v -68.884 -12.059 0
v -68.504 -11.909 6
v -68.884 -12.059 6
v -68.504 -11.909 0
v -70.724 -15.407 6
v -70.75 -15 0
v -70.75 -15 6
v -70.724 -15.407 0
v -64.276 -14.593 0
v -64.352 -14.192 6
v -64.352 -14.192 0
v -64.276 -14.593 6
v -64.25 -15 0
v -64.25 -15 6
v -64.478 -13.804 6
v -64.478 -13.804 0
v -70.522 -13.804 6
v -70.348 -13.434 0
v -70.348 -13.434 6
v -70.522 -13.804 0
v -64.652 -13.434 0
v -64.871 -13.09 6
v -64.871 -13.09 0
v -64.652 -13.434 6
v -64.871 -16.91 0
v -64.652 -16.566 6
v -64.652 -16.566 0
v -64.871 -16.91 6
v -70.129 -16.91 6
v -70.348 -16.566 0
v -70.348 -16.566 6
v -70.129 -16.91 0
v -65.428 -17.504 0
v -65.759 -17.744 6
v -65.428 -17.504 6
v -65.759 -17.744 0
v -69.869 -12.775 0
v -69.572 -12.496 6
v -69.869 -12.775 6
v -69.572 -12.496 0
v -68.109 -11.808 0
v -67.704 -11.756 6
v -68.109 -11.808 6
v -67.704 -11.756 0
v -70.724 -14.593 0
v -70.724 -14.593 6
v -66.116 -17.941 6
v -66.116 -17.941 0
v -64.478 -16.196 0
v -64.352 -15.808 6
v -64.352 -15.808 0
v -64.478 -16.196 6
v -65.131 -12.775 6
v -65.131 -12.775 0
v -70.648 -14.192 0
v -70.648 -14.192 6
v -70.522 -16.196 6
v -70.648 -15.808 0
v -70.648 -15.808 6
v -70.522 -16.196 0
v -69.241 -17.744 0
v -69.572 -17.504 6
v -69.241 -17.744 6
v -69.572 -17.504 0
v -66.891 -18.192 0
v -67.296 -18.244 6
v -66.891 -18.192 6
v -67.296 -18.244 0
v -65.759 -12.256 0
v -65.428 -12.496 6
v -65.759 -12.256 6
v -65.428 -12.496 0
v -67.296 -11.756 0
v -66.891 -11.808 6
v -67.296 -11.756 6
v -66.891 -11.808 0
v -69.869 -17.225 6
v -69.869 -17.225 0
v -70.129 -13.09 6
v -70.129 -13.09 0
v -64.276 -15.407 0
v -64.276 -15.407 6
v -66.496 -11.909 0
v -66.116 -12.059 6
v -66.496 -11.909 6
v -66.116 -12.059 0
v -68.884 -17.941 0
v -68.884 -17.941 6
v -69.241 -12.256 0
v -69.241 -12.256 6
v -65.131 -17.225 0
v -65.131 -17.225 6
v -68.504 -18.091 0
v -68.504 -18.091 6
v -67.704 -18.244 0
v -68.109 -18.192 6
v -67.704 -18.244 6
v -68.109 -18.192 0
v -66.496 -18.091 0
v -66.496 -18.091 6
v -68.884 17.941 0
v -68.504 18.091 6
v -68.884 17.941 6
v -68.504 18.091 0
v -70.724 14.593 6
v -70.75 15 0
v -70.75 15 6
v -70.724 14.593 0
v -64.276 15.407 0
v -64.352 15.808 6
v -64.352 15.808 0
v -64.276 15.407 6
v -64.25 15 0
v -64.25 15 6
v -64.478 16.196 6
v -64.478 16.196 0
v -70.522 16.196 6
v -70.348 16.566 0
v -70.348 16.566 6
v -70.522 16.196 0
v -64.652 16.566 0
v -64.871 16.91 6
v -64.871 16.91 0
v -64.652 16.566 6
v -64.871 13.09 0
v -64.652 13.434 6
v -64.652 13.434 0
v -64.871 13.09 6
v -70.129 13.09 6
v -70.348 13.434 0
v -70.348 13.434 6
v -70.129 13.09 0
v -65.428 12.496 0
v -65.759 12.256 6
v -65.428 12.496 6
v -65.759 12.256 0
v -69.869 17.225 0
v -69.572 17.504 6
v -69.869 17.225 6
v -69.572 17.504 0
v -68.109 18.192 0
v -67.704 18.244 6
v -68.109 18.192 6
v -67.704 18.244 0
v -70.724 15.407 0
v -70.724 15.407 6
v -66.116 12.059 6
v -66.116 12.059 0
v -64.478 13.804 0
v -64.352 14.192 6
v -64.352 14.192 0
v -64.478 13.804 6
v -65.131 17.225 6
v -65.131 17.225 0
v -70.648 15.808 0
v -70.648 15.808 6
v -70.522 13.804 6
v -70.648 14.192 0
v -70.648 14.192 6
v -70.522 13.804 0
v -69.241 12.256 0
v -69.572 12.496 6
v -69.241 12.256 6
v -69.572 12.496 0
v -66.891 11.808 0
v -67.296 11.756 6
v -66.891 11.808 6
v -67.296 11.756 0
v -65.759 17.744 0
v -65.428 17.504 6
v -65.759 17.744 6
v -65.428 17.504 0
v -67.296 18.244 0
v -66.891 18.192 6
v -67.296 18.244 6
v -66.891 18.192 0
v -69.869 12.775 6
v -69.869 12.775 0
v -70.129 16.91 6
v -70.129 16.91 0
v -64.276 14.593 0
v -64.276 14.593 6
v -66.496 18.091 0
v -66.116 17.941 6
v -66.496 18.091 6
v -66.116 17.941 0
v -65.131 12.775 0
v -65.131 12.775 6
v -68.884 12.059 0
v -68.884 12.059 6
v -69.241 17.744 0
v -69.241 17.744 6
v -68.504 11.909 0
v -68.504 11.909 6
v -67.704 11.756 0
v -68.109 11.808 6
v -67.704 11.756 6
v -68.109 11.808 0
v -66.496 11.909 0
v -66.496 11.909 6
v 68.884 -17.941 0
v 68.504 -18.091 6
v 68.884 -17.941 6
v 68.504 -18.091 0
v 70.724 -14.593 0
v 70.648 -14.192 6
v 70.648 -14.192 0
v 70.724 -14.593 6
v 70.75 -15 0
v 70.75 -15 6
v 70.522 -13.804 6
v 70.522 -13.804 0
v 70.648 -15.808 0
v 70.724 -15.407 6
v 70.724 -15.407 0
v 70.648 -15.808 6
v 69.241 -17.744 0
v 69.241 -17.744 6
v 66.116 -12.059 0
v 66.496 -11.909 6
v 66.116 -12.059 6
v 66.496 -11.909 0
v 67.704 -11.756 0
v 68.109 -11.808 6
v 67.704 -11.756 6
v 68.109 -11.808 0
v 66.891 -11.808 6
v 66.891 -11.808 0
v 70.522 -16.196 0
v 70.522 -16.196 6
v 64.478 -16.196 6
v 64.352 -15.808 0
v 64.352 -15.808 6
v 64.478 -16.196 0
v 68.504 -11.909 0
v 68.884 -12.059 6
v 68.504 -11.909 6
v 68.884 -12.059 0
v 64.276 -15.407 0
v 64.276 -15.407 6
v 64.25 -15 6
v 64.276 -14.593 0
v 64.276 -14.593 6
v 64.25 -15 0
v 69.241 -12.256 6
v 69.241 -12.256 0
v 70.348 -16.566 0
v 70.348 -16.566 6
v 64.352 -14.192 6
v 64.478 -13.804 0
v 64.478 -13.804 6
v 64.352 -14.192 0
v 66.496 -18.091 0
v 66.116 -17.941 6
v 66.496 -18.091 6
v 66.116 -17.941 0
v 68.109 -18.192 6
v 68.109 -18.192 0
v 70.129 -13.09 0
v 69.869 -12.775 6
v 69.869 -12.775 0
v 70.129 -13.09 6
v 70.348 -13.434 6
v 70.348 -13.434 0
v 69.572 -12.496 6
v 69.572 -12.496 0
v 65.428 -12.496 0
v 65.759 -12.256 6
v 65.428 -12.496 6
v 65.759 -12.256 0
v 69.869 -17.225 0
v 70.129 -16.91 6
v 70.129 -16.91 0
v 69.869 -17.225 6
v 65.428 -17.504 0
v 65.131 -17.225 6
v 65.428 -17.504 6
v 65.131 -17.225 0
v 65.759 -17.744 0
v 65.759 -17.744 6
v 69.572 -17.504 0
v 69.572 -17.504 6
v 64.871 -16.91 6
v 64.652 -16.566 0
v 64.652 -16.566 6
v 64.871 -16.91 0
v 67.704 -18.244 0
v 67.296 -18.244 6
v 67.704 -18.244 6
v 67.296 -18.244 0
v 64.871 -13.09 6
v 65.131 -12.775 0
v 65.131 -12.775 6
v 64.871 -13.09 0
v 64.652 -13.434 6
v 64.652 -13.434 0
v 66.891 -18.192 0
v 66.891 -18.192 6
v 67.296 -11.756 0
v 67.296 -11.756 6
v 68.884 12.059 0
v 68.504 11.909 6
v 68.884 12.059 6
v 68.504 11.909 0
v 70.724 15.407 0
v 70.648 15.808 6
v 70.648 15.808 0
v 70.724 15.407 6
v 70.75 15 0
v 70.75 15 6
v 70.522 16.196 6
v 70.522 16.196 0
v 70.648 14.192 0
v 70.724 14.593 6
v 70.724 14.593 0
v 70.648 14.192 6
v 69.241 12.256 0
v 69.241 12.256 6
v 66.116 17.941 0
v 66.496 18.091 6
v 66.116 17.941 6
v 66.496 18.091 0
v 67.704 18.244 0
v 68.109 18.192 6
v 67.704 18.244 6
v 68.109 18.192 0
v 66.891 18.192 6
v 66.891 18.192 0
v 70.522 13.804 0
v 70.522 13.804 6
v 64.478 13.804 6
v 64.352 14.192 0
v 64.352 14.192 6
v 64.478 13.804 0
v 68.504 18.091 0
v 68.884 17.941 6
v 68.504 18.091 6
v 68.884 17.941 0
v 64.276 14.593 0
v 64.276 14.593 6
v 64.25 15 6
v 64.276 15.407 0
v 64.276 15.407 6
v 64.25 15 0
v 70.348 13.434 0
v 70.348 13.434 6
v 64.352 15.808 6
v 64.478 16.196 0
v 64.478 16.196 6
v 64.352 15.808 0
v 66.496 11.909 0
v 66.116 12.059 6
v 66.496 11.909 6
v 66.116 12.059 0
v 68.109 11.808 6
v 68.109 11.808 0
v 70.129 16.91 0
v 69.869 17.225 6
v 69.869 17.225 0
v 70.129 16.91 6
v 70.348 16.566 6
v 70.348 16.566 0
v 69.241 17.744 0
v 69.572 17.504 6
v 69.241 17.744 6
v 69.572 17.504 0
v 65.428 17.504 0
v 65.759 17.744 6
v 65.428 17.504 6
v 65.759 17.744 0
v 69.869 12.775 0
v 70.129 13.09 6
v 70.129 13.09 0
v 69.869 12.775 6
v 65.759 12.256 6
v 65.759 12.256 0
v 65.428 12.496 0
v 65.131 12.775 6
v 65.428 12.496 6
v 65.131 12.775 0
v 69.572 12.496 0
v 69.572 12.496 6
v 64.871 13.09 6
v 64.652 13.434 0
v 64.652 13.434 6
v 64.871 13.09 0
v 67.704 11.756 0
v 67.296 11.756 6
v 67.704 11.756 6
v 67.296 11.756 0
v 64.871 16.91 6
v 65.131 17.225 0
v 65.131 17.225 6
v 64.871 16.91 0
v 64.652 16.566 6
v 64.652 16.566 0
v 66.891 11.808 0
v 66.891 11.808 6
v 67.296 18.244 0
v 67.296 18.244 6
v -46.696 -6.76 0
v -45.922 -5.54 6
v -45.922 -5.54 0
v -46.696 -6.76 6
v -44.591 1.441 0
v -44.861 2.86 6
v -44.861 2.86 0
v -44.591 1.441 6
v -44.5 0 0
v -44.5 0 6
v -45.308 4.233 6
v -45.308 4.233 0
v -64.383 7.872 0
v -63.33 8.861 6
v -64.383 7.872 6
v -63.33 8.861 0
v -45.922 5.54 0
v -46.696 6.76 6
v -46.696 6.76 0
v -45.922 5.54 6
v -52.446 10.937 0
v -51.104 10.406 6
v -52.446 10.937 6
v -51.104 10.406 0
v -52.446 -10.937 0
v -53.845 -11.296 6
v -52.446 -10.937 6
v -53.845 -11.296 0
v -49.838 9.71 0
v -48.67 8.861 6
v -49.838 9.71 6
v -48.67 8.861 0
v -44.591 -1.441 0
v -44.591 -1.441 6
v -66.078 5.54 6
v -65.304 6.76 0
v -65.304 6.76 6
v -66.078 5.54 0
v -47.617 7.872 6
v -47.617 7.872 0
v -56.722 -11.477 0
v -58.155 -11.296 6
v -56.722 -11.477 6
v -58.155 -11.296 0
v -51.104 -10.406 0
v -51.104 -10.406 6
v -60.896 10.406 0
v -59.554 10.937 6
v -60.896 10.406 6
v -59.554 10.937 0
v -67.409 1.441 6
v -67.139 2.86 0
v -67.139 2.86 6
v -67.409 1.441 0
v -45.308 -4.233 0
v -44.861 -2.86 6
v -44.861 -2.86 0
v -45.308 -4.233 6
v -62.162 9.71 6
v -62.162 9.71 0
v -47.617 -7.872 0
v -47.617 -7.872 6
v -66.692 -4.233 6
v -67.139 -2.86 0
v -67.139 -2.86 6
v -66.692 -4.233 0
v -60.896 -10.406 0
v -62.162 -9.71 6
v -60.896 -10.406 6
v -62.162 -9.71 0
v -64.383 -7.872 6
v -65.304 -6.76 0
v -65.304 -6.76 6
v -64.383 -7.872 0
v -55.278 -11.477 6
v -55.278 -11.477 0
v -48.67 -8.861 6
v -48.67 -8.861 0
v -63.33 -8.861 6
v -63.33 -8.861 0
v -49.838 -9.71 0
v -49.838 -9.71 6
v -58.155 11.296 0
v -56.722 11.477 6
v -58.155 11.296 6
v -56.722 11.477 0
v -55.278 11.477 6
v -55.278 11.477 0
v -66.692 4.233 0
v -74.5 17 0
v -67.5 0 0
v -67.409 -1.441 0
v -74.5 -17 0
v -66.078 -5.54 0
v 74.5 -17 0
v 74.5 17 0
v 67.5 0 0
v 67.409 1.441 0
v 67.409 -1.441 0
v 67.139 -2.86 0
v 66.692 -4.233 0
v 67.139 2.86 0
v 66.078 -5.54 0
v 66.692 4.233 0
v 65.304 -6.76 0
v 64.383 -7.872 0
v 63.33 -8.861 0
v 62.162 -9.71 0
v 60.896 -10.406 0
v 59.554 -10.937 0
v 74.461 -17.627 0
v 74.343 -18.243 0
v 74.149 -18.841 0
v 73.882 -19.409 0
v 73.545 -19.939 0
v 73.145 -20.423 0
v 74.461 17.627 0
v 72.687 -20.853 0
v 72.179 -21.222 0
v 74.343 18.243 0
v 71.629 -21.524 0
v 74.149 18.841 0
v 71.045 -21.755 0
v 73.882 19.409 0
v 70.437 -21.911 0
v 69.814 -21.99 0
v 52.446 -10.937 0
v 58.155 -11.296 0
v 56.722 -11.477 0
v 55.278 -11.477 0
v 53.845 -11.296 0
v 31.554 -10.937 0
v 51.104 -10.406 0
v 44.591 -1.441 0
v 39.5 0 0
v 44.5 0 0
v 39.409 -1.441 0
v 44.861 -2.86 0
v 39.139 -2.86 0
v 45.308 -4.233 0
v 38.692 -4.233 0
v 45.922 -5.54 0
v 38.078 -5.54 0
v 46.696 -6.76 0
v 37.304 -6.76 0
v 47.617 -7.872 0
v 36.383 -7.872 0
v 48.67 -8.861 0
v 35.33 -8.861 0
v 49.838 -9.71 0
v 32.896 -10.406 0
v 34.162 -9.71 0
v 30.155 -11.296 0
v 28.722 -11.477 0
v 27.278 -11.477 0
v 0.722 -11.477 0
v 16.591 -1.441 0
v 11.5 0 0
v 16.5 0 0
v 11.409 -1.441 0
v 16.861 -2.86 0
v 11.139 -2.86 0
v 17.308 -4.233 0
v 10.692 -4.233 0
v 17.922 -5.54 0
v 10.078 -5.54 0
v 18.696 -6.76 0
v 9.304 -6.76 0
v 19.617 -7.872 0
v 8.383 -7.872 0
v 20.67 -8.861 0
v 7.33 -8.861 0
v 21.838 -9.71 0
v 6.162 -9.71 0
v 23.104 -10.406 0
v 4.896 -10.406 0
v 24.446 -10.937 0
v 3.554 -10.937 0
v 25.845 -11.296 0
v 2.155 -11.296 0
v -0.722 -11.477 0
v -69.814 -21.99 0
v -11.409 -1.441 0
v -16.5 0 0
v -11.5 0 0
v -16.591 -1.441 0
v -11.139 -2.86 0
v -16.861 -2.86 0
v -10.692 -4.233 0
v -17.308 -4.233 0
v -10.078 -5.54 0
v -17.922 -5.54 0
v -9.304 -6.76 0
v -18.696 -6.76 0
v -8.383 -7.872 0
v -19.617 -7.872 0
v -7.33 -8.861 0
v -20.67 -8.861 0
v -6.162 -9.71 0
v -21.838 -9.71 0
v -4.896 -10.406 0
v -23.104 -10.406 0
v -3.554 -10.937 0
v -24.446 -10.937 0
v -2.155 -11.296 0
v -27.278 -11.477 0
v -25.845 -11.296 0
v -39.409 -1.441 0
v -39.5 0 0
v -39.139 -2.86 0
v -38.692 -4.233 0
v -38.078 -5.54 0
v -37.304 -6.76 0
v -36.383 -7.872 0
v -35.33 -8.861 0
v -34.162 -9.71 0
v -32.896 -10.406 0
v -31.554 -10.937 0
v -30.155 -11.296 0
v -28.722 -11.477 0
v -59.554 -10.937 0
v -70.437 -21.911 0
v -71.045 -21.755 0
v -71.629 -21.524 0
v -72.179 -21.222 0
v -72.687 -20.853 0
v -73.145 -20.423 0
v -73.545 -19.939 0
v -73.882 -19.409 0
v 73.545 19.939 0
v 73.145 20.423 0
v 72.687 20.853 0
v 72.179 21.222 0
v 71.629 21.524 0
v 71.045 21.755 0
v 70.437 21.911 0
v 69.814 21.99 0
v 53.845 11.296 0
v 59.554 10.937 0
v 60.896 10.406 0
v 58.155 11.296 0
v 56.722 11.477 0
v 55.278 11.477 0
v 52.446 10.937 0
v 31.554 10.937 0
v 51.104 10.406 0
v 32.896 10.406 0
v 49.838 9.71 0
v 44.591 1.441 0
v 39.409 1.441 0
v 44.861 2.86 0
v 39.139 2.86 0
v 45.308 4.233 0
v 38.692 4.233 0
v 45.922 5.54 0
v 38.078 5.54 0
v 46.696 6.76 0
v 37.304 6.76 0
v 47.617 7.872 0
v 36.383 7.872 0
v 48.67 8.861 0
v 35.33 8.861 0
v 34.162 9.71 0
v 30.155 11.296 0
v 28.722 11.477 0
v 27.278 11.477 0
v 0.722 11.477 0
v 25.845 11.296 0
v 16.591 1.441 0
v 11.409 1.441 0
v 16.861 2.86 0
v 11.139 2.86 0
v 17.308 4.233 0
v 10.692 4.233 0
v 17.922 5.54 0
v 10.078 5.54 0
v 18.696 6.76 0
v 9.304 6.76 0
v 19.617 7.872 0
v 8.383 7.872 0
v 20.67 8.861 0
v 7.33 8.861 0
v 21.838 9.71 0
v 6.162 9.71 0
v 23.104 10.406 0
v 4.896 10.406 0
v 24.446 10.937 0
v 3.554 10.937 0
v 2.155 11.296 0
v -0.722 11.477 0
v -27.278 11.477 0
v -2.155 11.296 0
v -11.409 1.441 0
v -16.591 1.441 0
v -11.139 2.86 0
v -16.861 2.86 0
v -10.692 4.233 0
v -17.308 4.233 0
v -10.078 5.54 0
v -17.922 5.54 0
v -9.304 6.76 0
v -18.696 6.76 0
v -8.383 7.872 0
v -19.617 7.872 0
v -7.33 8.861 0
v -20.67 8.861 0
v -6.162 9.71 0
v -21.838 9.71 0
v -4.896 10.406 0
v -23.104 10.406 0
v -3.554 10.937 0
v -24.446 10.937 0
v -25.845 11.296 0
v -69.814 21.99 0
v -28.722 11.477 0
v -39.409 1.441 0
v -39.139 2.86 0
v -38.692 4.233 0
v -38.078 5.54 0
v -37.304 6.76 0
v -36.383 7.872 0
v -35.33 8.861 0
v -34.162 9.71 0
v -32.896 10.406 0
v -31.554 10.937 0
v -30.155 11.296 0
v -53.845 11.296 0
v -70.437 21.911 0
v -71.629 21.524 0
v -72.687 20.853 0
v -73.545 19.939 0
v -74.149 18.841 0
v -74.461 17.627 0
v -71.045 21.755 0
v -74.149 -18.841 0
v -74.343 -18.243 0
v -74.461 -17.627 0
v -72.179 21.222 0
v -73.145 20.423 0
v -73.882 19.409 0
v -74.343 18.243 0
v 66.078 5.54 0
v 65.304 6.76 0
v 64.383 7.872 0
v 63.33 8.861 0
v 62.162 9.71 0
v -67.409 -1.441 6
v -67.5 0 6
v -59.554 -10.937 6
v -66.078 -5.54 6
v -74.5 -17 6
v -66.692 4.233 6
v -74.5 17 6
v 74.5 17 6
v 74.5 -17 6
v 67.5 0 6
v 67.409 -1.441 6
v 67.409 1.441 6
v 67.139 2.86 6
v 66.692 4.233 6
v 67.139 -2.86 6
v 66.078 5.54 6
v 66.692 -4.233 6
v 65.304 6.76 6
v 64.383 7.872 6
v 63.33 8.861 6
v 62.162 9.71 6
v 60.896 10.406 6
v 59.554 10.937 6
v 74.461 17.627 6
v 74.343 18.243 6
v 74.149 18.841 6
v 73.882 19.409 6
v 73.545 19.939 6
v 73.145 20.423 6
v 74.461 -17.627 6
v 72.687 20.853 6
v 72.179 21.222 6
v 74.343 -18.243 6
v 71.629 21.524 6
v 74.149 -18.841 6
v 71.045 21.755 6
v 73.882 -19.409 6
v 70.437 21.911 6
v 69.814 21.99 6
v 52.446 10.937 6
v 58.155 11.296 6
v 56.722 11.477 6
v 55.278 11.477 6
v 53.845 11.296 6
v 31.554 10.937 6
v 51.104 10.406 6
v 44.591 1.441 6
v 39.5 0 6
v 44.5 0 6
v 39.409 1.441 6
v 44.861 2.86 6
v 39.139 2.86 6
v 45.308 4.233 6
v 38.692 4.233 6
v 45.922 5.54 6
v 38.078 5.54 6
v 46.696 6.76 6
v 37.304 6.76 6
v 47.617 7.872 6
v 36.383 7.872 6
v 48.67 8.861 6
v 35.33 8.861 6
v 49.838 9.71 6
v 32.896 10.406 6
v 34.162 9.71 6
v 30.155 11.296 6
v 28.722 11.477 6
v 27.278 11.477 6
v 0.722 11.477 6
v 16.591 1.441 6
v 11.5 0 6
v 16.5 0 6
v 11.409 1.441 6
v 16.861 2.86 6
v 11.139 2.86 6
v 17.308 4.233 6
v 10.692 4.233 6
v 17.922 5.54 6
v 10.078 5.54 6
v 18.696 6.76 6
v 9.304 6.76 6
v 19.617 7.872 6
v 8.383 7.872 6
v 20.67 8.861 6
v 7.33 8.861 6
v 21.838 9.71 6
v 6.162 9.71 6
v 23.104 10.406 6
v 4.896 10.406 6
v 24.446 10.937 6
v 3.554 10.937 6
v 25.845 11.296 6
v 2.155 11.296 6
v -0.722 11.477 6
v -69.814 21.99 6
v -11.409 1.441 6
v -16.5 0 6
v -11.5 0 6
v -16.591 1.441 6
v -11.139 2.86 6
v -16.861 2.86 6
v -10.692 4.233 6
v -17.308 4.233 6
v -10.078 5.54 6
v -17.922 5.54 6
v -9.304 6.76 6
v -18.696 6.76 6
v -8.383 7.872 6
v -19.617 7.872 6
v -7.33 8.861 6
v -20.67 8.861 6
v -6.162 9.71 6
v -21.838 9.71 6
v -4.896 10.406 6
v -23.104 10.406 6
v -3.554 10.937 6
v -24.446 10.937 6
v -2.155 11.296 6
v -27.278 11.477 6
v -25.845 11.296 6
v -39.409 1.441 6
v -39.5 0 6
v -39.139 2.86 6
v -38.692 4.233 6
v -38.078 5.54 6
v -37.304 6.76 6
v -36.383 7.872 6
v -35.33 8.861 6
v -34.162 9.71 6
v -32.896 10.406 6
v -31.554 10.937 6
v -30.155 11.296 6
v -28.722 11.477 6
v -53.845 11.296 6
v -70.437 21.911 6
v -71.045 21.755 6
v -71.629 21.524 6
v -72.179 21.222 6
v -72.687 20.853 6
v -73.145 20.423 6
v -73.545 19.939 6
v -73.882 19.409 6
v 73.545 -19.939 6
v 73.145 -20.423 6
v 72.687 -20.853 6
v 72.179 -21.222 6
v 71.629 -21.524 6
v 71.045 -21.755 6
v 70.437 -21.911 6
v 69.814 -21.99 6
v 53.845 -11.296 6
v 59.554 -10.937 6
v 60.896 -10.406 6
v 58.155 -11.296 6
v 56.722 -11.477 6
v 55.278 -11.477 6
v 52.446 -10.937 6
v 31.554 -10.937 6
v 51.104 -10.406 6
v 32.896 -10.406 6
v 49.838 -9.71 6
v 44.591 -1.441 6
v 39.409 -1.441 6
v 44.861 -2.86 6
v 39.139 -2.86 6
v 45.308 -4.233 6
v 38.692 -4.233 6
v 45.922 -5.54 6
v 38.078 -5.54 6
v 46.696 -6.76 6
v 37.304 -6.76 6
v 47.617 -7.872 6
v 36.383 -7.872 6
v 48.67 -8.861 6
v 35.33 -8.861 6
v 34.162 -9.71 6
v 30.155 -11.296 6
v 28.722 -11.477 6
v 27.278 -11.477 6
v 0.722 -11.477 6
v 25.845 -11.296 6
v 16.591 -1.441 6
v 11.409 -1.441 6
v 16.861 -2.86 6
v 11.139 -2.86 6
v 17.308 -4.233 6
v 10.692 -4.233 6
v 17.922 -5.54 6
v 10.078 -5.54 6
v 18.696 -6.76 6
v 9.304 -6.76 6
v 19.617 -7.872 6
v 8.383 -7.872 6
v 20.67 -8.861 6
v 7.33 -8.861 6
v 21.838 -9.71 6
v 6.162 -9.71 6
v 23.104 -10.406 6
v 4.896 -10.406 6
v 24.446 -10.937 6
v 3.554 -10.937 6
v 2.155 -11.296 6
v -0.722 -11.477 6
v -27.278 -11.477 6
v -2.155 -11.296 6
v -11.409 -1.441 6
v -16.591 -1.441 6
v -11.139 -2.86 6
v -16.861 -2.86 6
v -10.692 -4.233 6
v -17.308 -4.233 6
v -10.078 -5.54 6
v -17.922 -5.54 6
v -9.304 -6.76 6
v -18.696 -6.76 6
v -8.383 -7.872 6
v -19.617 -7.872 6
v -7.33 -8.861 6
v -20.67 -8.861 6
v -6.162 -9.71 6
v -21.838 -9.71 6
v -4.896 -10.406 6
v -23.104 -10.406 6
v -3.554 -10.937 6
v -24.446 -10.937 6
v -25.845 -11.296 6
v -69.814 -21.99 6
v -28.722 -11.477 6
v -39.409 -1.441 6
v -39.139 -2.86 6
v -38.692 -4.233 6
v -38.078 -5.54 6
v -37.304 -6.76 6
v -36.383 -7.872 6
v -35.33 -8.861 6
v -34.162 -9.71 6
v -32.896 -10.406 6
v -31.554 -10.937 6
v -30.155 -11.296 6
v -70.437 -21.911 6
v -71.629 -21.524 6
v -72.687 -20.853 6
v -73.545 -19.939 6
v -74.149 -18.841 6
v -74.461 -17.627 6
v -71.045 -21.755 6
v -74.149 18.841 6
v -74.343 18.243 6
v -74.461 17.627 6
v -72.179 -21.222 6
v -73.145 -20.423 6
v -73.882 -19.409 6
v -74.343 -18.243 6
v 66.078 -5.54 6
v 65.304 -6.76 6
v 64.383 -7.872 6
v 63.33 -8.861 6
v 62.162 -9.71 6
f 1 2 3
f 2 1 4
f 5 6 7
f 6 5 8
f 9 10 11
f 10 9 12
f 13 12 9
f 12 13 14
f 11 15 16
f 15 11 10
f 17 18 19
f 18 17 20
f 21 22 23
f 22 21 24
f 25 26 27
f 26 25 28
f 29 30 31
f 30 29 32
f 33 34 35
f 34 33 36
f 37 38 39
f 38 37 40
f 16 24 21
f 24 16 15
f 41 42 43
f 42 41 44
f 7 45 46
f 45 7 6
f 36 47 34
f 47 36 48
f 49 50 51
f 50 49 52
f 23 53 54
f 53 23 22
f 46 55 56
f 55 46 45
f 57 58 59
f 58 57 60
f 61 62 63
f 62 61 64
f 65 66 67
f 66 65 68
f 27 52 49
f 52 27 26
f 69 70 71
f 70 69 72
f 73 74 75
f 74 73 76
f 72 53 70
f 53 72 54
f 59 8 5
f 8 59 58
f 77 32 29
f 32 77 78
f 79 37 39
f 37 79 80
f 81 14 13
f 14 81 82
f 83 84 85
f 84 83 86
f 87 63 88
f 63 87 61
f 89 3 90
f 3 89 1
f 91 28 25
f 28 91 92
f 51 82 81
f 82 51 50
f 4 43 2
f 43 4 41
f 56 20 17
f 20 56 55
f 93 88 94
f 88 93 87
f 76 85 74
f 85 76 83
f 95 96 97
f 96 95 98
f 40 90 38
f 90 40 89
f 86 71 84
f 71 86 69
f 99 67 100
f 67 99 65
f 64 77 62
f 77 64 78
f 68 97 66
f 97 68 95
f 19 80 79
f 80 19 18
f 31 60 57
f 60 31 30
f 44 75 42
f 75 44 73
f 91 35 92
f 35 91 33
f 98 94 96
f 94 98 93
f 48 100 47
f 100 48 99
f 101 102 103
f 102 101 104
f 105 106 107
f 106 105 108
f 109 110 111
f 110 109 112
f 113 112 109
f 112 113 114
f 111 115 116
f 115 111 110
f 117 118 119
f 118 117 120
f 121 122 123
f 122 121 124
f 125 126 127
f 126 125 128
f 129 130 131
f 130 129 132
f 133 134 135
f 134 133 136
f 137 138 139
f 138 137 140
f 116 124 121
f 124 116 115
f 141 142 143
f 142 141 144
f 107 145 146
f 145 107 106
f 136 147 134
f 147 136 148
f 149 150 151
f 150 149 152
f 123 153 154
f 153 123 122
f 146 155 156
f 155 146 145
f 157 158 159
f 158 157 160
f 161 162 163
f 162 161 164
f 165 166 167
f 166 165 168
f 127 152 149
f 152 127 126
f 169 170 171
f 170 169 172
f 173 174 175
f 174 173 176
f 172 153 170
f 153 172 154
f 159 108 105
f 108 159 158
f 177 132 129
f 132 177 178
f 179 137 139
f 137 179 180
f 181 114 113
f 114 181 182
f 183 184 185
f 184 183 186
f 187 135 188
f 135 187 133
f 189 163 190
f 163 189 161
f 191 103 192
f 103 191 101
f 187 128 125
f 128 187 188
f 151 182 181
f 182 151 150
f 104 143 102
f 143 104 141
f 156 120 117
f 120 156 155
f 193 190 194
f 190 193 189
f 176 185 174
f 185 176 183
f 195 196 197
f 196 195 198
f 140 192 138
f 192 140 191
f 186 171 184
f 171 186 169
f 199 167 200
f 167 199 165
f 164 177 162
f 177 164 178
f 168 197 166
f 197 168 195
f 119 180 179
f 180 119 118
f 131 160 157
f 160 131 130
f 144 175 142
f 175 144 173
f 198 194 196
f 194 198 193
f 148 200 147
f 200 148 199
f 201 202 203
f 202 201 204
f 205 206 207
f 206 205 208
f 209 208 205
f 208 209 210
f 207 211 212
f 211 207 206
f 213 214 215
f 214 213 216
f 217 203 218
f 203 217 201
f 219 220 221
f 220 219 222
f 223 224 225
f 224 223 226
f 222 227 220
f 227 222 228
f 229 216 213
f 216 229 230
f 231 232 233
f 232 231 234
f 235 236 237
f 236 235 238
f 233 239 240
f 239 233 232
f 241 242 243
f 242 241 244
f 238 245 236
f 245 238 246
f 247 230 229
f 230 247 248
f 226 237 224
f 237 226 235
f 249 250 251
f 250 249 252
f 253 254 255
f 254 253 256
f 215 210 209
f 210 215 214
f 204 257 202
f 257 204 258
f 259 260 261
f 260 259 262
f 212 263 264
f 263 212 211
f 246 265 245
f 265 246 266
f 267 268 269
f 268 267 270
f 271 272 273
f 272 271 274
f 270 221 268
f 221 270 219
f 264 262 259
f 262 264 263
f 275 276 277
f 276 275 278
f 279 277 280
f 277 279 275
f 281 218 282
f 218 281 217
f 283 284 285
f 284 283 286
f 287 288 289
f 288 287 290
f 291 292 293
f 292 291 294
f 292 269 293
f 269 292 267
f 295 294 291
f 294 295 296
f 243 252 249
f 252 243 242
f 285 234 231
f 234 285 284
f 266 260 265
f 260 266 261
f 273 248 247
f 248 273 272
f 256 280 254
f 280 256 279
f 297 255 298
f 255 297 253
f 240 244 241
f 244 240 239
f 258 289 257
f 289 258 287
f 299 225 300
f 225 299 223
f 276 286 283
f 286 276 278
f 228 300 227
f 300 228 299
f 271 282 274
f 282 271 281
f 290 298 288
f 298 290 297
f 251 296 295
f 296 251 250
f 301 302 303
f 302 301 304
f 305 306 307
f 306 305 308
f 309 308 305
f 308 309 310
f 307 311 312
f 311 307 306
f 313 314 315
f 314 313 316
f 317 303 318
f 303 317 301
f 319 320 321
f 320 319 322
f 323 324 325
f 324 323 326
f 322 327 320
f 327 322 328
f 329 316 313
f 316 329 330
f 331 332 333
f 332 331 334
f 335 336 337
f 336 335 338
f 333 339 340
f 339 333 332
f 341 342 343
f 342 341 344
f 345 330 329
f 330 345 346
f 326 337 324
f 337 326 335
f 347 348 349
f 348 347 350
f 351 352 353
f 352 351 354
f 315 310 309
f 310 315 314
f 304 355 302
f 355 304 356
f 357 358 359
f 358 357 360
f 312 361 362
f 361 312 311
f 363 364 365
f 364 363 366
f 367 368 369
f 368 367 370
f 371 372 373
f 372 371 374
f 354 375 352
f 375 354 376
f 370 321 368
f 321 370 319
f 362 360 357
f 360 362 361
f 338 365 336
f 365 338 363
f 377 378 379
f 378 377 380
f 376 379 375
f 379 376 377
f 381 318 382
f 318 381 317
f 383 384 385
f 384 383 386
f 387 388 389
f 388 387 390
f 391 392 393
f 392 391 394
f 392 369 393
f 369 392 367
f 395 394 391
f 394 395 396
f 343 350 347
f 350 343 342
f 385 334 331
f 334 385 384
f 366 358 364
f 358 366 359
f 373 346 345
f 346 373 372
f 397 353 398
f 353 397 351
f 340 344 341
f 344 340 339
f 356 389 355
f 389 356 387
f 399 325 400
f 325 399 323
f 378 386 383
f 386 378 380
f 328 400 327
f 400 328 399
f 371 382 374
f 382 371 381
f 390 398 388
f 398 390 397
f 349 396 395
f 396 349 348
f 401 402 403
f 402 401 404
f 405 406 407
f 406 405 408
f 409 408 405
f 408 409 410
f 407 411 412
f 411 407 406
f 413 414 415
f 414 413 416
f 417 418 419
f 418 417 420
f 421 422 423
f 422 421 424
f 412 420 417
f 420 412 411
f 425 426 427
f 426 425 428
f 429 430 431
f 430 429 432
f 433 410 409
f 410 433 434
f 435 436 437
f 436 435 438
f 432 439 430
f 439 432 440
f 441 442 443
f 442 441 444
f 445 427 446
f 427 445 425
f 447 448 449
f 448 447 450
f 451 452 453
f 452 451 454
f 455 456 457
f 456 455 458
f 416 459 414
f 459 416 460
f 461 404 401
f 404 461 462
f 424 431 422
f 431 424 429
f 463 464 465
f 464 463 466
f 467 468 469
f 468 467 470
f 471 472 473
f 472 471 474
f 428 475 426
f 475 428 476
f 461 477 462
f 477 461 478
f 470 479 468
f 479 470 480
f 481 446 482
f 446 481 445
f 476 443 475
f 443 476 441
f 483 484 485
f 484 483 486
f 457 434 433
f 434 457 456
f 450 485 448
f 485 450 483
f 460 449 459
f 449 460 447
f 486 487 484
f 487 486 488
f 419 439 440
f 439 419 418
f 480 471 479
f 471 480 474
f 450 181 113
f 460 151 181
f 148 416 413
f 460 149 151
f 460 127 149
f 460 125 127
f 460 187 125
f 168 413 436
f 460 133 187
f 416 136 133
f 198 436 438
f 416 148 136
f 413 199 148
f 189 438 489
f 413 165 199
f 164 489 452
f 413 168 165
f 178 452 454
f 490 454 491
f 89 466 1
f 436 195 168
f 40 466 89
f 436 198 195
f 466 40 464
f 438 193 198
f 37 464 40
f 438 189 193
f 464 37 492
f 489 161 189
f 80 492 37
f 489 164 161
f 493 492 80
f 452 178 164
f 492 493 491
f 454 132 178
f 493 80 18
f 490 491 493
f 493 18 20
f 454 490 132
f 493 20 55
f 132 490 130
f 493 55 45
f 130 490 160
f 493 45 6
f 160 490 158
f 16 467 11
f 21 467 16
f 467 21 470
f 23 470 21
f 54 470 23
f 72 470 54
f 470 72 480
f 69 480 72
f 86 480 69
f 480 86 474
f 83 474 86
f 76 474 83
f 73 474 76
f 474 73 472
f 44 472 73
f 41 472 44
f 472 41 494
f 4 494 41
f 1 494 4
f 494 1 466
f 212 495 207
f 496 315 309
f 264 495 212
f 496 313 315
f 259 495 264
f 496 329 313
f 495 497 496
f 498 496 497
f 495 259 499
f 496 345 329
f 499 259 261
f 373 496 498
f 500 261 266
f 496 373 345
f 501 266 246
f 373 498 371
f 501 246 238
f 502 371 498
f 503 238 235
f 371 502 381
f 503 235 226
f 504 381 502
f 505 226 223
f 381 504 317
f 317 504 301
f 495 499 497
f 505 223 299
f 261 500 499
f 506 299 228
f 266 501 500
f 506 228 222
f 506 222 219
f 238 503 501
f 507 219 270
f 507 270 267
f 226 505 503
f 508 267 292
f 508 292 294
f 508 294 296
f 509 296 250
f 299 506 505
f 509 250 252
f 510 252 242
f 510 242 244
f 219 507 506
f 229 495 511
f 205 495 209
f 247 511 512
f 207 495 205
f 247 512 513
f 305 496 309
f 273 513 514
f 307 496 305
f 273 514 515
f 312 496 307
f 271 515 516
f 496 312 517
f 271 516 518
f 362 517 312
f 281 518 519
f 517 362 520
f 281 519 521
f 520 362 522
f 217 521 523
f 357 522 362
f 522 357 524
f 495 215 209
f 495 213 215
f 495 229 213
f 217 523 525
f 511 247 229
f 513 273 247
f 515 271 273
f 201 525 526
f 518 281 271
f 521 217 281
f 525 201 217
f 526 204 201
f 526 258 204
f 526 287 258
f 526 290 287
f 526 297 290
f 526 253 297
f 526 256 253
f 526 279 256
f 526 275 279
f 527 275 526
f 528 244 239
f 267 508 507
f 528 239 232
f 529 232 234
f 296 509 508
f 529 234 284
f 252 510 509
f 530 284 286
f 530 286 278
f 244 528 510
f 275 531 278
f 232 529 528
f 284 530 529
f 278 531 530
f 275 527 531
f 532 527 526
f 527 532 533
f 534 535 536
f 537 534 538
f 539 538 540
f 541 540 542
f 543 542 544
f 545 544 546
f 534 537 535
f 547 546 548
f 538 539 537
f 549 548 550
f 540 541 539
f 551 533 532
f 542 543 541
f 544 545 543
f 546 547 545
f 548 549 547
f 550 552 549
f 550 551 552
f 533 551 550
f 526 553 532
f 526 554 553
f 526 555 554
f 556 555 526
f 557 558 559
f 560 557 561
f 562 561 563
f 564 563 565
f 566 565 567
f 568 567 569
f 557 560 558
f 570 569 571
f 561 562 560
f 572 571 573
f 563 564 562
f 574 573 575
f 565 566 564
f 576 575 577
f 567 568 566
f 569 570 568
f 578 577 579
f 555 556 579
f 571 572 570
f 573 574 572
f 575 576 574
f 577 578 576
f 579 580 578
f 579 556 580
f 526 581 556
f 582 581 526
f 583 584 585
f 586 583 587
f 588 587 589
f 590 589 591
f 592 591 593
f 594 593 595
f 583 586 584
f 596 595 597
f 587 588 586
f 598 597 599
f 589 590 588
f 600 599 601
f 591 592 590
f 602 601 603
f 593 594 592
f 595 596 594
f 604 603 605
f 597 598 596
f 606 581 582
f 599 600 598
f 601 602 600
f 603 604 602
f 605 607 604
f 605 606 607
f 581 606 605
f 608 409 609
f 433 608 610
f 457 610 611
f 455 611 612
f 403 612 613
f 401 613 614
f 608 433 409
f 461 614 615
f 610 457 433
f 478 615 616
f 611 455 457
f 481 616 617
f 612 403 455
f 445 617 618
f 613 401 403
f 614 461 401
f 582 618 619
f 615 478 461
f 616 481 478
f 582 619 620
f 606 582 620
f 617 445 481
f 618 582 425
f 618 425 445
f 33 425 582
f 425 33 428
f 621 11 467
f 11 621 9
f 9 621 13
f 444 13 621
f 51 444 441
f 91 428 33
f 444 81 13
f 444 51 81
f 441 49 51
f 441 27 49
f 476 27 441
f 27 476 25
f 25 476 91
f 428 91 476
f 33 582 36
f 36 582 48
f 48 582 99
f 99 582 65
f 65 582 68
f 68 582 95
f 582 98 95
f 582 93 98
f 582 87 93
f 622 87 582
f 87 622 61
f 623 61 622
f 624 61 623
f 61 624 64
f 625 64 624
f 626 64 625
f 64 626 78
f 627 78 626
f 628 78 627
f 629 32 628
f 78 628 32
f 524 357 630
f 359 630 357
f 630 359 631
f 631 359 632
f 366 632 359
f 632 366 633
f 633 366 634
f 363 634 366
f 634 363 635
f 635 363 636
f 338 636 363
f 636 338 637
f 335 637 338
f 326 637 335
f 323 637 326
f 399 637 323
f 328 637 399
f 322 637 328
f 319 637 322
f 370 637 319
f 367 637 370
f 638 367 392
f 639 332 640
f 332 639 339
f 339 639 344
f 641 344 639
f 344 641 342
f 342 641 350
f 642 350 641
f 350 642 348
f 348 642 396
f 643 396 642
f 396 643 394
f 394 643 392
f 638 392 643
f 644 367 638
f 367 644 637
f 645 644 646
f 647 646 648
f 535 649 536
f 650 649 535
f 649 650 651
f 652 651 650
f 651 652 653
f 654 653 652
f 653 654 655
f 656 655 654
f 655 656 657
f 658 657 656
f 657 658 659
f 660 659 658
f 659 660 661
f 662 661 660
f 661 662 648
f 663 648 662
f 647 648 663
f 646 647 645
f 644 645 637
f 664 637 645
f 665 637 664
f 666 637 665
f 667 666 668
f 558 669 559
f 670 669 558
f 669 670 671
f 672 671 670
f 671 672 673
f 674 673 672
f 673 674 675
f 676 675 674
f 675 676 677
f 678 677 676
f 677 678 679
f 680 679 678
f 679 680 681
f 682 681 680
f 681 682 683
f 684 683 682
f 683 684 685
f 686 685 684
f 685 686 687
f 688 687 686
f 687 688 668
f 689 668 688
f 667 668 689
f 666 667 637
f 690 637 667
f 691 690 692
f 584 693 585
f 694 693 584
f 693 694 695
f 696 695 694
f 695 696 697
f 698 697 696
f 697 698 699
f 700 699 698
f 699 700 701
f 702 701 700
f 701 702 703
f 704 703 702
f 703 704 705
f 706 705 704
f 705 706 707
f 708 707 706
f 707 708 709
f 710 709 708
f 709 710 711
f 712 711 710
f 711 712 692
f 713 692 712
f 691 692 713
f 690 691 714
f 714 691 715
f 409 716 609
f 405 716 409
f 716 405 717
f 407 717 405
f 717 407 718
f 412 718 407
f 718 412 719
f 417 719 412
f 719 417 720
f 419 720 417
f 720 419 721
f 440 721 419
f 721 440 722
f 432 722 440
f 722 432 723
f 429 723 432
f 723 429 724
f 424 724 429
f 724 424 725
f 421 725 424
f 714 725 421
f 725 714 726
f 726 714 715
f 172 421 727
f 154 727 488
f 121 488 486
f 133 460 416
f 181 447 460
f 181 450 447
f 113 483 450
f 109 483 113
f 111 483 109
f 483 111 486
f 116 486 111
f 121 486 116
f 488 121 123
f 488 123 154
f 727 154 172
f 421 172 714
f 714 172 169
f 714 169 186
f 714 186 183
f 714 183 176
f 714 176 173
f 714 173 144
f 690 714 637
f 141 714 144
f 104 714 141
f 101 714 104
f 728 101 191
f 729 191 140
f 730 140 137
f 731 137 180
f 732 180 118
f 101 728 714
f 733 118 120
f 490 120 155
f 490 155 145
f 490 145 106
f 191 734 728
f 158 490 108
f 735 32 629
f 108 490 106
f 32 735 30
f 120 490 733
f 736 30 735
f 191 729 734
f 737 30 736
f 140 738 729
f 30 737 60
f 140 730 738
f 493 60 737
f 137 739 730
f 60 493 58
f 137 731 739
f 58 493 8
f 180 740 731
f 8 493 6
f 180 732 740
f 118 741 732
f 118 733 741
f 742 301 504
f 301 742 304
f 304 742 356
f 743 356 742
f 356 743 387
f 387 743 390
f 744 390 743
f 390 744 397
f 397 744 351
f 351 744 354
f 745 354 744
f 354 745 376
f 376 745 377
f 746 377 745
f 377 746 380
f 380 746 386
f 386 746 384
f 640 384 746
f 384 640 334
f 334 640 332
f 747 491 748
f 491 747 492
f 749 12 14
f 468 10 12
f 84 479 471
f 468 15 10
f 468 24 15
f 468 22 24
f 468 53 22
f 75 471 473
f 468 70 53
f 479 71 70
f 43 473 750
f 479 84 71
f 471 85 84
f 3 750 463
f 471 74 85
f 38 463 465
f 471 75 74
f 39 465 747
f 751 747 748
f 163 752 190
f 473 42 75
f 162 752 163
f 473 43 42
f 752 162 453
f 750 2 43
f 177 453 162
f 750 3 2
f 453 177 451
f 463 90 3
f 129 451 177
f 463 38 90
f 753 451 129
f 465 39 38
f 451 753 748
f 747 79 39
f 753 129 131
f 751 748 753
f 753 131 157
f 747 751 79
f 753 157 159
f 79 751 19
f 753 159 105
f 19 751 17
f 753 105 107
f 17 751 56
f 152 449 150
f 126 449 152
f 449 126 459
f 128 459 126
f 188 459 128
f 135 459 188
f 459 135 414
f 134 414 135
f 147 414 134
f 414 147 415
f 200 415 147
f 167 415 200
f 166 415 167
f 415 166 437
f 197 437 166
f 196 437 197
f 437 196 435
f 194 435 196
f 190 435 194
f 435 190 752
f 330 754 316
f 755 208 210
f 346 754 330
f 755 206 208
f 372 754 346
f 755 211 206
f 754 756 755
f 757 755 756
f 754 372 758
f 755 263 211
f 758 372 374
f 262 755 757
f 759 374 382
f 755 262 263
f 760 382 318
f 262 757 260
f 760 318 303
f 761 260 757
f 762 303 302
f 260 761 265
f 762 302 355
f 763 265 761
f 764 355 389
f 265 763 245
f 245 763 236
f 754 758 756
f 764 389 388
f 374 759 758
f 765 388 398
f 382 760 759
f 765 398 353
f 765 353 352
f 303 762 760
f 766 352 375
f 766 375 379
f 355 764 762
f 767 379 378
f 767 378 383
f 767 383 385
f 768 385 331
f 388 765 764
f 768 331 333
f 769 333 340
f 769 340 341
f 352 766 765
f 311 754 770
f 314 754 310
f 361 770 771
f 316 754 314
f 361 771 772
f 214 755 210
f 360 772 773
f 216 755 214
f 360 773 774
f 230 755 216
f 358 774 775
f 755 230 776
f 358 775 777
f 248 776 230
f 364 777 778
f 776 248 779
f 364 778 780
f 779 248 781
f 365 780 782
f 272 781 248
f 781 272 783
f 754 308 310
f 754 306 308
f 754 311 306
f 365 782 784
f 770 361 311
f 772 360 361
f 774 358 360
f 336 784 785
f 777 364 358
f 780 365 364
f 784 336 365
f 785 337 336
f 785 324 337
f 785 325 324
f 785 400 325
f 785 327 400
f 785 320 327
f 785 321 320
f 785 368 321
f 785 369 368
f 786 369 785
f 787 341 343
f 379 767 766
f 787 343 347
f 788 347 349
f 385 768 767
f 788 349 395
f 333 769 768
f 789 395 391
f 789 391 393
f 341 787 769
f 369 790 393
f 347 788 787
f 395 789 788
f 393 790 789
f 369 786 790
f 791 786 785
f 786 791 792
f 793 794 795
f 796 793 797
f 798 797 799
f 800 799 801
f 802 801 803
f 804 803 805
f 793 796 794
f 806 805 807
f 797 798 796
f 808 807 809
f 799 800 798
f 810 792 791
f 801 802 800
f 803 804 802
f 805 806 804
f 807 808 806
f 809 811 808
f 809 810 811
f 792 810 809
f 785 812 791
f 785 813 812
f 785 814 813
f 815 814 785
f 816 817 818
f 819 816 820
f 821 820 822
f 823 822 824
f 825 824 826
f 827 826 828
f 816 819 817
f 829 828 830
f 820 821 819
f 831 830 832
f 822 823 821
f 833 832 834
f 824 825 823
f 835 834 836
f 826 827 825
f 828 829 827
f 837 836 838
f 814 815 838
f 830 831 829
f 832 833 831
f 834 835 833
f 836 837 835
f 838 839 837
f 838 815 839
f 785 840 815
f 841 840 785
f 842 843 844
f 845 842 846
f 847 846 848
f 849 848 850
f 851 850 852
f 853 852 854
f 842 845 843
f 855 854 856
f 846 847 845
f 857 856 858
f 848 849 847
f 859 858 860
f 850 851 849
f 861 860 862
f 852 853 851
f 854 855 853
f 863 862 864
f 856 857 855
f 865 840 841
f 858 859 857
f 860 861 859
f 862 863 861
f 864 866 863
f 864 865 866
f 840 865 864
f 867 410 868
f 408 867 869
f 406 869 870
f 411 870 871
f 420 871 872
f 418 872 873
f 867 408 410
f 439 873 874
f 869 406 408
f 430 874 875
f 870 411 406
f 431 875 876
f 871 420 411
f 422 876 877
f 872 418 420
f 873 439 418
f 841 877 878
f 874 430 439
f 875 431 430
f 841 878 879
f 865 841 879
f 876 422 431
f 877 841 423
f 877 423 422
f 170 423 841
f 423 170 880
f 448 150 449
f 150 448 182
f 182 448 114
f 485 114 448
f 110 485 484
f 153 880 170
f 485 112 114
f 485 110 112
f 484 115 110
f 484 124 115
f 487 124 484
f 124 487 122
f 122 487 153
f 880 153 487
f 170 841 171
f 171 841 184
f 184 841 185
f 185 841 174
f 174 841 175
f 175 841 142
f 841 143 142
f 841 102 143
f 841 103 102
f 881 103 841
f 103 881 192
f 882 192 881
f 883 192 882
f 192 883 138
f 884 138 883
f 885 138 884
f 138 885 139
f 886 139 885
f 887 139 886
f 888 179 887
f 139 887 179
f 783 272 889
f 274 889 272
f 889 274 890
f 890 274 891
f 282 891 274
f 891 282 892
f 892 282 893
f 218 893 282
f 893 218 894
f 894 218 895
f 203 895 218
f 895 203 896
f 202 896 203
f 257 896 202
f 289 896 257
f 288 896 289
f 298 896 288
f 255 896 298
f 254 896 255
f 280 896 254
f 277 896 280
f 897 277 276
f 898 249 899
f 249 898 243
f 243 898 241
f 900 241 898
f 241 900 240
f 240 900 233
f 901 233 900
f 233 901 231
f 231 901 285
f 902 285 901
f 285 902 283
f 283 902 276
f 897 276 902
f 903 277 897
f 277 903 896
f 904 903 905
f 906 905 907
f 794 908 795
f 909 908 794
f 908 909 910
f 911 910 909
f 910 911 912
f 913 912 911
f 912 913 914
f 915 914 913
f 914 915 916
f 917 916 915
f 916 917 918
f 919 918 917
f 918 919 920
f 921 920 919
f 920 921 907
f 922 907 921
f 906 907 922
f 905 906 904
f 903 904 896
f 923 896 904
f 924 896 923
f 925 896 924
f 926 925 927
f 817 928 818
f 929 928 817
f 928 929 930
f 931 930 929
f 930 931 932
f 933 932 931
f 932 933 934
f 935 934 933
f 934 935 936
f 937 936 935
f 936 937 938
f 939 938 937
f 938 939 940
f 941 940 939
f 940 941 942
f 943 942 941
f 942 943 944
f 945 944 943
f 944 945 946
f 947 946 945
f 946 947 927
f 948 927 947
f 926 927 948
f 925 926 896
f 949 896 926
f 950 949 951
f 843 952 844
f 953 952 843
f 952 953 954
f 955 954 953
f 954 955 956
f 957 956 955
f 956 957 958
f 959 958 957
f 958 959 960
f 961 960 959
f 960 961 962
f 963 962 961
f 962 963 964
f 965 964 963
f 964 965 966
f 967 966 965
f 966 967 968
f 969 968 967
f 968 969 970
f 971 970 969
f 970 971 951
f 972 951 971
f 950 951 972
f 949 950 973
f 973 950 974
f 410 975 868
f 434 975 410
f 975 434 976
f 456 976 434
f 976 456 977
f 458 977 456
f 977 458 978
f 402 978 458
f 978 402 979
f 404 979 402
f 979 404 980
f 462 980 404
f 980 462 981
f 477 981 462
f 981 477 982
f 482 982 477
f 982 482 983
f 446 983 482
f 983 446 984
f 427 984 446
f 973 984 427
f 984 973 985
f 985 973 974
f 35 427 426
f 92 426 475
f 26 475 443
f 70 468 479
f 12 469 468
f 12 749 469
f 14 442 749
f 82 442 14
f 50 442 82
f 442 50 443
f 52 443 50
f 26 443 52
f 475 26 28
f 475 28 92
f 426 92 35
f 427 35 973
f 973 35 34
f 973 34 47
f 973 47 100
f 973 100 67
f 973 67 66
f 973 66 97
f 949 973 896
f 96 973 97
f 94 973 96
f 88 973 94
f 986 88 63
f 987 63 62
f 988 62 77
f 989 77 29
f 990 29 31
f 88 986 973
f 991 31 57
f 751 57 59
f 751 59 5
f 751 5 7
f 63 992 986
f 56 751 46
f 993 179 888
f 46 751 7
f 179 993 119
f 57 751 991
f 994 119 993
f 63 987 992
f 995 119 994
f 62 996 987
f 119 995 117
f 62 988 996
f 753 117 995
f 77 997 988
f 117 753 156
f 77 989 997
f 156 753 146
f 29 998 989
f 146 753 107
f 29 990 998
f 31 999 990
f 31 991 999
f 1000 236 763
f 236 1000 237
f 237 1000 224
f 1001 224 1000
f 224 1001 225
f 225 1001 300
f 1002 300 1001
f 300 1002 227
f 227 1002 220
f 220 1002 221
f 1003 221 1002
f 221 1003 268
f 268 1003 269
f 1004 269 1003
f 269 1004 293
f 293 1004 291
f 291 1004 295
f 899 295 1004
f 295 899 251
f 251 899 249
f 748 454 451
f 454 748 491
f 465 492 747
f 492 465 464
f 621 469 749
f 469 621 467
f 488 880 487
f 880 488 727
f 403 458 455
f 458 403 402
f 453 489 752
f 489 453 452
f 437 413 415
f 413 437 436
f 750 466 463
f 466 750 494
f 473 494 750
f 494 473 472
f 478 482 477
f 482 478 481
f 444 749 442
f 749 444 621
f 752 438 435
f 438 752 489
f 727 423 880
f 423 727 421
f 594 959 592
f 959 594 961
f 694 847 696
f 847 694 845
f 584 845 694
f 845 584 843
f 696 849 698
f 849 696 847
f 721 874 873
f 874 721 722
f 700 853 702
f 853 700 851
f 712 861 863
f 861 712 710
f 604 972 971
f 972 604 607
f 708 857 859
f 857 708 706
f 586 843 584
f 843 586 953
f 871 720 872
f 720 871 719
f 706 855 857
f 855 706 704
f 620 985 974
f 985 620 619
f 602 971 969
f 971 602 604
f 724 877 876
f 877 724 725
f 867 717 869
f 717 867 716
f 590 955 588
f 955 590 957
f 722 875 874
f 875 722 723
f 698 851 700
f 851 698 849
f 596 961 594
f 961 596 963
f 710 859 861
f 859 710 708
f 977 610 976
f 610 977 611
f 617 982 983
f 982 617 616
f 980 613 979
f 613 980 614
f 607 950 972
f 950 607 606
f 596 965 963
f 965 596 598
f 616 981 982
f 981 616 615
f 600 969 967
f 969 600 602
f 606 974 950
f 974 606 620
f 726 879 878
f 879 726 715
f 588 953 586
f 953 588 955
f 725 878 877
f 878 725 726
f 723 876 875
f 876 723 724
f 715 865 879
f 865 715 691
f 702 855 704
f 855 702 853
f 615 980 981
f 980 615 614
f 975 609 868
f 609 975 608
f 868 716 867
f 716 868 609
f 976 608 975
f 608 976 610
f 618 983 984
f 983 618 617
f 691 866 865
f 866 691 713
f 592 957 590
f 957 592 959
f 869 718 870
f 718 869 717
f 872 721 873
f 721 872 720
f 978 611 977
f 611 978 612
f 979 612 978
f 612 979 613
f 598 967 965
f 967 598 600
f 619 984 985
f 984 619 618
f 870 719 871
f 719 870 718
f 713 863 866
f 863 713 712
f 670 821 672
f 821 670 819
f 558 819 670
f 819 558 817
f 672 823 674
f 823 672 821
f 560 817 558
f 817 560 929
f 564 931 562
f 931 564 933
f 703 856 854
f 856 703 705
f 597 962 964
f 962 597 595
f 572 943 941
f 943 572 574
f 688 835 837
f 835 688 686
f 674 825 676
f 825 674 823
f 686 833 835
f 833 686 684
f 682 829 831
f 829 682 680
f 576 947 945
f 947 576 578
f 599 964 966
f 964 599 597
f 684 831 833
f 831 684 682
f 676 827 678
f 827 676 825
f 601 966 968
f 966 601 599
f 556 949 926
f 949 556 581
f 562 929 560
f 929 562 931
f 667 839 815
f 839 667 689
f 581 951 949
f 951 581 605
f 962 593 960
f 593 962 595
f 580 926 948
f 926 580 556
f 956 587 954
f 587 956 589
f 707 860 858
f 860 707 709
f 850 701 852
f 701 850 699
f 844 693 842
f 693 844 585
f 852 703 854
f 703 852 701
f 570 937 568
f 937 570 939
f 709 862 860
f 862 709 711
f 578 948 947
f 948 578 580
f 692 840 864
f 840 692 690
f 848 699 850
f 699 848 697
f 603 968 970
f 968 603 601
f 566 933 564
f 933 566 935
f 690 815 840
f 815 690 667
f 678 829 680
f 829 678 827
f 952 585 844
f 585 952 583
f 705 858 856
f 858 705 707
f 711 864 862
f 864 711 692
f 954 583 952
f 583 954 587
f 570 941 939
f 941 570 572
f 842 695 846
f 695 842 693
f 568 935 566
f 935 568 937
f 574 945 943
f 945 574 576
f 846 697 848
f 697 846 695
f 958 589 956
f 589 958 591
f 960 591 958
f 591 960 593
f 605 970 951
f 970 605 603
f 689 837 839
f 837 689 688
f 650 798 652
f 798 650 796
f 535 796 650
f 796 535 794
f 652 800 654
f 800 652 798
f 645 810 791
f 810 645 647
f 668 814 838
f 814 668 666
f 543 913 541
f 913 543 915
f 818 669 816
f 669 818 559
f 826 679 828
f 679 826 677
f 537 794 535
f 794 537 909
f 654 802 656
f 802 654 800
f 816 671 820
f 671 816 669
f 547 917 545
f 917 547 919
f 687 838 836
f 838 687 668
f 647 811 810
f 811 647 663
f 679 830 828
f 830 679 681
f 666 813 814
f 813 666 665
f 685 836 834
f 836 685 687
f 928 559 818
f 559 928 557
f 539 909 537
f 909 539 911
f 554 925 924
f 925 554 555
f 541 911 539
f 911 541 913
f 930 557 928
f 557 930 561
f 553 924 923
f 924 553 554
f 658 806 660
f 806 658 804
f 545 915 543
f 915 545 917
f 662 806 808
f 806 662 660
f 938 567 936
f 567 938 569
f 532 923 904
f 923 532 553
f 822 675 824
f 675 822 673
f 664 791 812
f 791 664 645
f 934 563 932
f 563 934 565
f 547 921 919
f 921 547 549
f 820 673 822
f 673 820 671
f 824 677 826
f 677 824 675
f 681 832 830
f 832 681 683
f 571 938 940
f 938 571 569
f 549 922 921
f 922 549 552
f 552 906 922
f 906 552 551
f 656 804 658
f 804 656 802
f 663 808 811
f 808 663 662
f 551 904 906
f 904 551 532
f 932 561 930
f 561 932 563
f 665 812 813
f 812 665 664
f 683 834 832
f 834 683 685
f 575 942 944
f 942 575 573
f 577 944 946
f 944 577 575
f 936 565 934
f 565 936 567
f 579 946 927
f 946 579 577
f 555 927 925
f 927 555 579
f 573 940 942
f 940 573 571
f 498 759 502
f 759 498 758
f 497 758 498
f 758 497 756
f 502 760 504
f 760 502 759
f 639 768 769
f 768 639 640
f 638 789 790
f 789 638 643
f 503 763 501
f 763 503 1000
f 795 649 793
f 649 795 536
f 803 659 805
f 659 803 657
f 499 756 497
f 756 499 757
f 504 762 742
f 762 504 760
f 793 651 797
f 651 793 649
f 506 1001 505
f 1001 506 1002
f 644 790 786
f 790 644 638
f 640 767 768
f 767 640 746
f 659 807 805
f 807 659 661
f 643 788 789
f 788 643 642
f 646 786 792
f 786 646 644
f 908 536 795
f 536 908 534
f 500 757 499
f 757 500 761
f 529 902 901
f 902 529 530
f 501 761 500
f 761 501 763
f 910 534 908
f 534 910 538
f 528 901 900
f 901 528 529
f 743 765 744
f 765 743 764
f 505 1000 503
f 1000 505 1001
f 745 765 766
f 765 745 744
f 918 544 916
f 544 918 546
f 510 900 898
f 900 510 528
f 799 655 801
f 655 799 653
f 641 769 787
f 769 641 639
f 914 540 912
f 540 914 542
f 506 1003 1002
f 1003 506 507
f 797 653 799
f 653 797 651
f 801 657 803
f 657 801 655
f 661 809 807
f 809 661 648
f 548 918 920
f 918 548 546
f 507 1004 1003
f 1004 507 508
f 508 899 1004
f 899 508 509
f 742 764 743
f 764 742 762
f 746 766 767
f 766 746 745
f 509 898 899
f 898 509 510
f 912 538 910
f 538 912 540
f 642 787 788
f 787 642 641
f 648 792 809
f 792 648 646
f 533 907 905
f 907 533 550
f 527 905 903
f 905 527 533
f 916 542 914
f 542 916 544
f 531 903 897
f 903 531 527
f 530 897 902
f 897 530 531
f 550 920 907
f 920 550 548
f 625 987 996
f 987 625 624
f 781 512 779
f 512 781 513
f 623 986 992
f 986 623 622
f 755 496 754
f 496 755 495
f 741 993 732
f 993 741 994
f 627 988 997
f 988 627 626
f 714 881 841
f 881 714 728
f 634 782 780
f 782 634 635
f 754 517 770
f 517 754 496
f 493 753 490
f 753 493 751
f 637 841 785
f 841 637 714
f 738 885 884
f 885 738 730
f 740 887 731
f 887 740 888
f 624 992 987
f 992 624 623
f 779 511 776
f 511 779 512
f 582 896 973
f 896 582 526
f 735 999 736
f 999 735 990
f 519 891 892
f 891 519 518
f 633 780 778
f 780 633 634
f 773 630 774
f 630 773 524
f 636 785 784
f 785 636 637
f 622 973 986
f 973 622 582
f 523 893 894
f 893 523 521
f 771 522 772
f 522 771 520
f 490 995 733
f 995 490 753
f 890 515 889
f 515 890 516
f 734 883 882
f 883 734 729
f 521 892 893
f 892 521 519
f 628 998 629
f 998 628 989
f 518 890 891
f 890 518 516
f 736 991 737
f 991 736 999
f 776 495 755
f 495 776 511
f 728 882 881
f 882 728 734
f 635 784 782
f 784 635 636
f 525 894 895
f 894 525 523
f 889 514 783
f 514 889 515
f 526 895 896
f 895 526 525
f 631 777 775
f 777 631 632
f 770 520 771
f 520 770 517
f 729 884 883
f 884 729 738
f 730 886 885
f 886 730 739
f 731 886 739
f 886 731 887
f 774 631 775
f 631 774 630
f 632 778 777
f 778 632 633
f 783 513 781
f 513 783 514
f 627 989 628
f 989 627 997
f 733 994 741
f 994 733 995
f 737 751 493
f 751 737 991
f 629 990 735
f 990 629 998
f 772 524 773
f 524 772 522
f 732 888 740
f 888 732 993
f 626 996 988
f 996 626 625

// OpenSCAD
$fn = 50;


difference() {
	union() {
		hull() {
			translate(v = [-69.5000000000, 17.0000000000, 0]) {
				cylinder(h = 6, r = 5);
			}
			translate(v = [69.5000000000, 17.0000000000, 0]) {
				cylinder(h = 6, r = 5);
			}
			translate(v = [-69.5000000000, -17.0000000000, 0]) {
				cylinder(h = 6, r = 5);
			}
			translate(v = [69.5000000000, -17.0000000000, 0]) {
				cylinder(h = 6, r = 5);
			}
		}
	}
	union() {
		#translate(v = [-67.5000000000, -15.0000000000, -100.0000000000]) {
			cylinder(h = 200, r = 3.2500000000);
		}
		#translate(v = [-67.5000000000, 15.0000000000, -100.0000000000]) {
			cylinder(h = 200, r = 3.2500000000);
		}
		#translate(v = [67.5000000000, -15.0000000000, -100.0000000000]) {
			cylinder(h = 200, r = 3.2500000000);
		}
		#translate(v = [67.5000000000, 15.0000000000, -100.0000000000]) {
			cylinder(h = 200, r = 3.2500000000);
		}
		#translate(v = [-56.0000000000, 0, 0]) {
			cylinder(h = 6, r = 11.5000000000);
		}
		#translate(v = [-28.0000000000, 0, 0]) {
			cylinder(h = 6, r = 11.5000000000);
		}
		#cylinder(h = 6, r = 11.5000000000);
		#translate(v = [28.0000000000, 0, 0]) {
			cylinder(h = 6, r = 11.5000000000);
		}
		#translate(v = [56.0000000000, 0, 0]) {
			cylinder(h = 6, r = 11.5000000000);
		}
	}
}
